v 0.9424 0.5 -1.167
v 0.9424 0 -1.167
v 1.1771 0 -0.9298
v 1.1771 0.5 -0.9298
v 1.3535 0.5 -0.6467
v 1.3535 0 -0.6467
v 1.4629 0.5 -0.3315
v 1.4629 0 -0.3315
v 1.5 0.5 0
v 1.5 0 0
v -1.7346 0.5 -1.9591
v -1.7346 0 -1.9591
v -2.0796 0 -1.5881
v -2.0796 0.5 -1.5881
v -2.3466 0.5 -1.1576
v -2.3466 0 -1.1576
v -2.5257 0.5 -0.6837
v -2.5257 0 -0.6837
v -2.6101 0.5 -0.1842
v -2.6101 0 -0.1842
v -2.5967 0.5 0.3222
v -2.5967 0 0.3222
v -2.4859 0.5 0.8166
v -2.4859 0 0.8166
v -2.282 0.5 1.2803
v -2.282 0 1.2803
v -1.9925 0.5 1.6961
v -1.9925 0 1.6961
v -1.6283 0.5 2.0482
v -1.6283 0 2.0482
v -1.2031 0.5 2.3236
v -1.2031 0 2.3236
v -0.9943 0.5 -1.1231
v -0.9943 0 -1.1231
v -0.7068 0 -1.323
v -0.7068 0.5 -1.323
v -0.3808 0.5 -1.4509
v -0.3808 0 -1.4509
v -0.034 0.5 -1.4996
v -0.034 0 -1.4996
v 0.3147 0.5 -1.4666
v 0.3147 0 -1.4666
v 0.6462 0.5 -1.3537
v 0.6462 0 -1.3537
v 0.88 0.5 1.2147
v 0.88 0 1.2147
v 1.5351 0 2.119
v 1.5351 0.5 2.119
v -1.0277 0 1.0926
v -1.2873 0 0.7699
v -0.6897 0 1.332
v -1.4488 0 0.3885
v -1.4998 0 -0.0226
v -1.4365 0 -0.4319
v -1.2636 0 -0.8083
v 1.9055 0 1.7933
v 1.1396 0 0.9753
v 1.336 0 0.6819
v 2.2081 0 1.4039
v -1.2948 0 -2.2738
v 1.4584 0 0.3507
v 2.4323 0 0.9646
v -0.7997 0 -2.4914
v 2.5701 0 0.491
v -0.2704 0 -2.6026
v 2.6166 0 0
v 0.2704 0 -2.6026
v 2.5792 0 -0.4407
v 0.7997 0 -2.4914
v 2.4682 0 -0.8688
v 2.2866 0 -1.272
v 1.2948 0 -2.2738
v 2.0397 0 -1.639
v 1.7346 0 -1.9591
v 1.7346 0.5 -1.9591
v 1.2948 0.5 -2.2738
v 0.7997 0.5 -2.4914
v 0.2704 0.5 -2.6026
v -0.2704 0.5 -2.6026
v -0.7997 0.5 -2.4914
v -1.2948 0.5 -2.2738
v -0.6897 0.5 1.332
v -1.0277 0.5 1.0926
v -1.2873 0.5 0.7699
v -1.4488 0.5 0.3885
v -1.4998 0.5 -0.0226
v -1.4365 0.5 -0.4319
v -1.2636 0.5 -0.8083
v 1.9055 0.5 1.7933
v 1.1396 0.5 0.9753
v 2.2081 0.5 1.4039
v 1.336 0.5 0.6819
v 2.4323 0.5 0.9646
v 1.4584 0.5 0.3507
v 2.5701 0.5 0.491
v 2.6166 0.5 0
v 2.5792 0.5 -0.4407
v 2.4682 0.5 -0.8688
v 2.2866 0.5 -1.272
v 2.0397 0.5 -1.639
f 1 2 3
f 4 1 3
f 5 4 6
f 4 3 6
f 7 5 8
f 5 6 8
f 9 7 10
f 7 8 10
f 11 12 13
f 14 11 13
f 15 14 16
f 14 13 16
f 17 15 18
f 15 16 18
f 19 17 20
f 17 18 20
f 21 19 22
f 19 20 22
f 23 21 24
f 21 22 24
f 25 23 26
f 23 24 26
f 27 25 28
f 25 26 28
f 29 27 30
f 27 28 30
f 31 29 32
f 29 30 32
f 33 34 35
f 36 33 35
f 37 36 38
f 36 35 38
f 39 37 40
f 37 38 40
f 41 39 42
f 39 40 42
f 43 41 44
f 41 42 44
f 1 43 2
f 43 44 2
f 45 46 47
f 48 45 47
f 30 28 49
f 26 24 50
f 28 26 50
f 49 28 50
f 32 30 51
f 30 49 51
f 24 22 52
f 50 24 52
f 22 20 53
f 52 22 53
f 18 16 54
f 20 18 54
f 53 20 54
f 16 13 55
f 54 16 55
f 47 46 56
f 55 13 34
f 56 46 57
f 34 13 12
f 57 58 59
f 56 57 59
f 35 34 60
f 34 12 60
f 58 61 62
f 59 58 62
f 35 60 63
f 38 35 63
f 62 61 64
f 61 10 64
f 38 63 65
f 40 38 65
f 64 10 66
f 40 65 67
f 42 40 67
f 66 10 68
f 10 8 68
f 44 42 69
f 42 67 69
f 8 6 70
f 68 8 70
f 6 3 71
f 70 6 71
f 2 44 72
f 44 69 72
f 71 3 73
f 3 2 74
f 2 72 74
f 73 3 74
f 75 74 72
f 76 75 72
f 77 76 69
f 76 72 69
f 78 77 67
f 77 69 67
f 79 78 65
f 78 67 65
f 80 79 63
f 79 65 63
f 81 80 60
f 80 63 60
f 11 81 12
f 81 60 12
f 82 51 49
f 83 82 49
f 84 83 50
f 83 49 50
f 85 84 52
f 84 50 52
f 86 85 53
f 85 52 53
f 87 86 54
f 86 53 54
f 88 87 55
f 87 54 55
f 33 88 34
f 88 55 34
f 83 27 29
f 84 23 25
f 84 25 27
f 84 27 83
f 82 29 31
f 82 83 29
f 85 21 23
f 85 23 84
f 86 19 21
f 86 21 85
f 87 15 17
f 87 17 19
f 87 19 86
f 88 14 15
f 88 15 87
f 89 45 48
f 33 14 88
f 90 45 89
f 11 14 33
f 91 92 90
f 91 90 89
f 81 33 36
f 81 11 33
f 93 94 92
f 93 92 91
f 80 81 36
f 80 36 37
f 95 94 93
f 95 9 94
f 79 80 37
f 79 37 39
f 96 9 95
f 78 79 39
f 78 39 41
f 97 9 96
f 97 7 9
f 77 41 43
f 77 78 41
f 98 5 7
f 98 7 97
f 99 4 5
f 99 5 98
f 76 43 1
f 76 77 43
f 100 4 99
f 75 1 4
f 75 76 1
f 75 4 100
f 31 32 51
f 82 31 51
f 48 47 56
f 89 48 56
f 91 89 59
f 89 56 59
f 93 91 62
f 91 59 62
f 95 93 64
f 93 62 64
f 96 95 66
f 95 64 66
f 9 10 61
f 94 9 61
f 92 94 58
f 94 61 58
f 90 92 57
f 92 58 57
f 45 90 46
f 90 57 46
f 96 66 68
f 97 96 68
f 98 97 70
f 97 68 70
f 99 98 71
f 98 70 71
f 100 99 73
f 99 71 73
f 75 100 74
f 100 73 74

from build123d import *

# Parameters (mm, degrees)
BOSS_EXTRUDE1_DEPTH = 0.5


with BuildPart() as part:
    # Sketch1 → Boss-Extrude1 (new body)
    with BuildSketch(Plane(origin=(0, 0, 0), x_dir=(1, 0, 0), z_dir=(0, 1, 0))):
        with BuildLine():
            ThreePointArc((1.734559672, 1.959088748), (0, 2.616624921), (-1.734559672, 1.959088748))
            Line((-1.734559672, 1.959088748), (-0.994349434, 1.123062422))
            ThreePointArc((-0.994349434, 1.123062422), (-0.033994196, 1.499614749), (0.942437635, 1.166966711))
            Line((0.942437635, 1.166966711), (1.734559672, 1.959088748))
        make_face()
        with BuildLine():
            ThreePointArc((-1.734559672, 1.959088748), (-2.596707821, -0.32223357), (-1.203103437, -2.323632522))
            Line((-1.203103437, -2.323632522), (-0.689688133, -1.332039894))
            ThreePointArc((-0.689688133, -1.332039894), (-1.488582372, -0.184722828), (-0.994349434, 1.123062422))
            Line((-0.994349434, 1.123062422), (-1.734559672, 1.959088748))
        make_face()
        with BuildLine():
            Line((0.880018763, -1.214729178), (1.535119351, -2.11899376))
            ThreePointArc((1.535119351, -2.11899376), (2.330617679, -1.189515537), (2.616624921, 0))
            ThreePointArc((2.616624921, 0), (2.385939861, 1.074251812), (1.734559672, 1.959088748))
            Line((1.734559672, 1.959088748), (0.942437635, 1.166966711))
            ThreePointArc((0.942437635, 1.166966711), (1.353450489, 0.646662024), (1.5, 0))
            ThreePointArc((1.5, 0), (1.336044188, -0.681898766), (0.880018763, -1.214729178))
        make_face()
    extrude(amount=BOSS_EXTRUDE1_DEPTH)


solid = part.part
